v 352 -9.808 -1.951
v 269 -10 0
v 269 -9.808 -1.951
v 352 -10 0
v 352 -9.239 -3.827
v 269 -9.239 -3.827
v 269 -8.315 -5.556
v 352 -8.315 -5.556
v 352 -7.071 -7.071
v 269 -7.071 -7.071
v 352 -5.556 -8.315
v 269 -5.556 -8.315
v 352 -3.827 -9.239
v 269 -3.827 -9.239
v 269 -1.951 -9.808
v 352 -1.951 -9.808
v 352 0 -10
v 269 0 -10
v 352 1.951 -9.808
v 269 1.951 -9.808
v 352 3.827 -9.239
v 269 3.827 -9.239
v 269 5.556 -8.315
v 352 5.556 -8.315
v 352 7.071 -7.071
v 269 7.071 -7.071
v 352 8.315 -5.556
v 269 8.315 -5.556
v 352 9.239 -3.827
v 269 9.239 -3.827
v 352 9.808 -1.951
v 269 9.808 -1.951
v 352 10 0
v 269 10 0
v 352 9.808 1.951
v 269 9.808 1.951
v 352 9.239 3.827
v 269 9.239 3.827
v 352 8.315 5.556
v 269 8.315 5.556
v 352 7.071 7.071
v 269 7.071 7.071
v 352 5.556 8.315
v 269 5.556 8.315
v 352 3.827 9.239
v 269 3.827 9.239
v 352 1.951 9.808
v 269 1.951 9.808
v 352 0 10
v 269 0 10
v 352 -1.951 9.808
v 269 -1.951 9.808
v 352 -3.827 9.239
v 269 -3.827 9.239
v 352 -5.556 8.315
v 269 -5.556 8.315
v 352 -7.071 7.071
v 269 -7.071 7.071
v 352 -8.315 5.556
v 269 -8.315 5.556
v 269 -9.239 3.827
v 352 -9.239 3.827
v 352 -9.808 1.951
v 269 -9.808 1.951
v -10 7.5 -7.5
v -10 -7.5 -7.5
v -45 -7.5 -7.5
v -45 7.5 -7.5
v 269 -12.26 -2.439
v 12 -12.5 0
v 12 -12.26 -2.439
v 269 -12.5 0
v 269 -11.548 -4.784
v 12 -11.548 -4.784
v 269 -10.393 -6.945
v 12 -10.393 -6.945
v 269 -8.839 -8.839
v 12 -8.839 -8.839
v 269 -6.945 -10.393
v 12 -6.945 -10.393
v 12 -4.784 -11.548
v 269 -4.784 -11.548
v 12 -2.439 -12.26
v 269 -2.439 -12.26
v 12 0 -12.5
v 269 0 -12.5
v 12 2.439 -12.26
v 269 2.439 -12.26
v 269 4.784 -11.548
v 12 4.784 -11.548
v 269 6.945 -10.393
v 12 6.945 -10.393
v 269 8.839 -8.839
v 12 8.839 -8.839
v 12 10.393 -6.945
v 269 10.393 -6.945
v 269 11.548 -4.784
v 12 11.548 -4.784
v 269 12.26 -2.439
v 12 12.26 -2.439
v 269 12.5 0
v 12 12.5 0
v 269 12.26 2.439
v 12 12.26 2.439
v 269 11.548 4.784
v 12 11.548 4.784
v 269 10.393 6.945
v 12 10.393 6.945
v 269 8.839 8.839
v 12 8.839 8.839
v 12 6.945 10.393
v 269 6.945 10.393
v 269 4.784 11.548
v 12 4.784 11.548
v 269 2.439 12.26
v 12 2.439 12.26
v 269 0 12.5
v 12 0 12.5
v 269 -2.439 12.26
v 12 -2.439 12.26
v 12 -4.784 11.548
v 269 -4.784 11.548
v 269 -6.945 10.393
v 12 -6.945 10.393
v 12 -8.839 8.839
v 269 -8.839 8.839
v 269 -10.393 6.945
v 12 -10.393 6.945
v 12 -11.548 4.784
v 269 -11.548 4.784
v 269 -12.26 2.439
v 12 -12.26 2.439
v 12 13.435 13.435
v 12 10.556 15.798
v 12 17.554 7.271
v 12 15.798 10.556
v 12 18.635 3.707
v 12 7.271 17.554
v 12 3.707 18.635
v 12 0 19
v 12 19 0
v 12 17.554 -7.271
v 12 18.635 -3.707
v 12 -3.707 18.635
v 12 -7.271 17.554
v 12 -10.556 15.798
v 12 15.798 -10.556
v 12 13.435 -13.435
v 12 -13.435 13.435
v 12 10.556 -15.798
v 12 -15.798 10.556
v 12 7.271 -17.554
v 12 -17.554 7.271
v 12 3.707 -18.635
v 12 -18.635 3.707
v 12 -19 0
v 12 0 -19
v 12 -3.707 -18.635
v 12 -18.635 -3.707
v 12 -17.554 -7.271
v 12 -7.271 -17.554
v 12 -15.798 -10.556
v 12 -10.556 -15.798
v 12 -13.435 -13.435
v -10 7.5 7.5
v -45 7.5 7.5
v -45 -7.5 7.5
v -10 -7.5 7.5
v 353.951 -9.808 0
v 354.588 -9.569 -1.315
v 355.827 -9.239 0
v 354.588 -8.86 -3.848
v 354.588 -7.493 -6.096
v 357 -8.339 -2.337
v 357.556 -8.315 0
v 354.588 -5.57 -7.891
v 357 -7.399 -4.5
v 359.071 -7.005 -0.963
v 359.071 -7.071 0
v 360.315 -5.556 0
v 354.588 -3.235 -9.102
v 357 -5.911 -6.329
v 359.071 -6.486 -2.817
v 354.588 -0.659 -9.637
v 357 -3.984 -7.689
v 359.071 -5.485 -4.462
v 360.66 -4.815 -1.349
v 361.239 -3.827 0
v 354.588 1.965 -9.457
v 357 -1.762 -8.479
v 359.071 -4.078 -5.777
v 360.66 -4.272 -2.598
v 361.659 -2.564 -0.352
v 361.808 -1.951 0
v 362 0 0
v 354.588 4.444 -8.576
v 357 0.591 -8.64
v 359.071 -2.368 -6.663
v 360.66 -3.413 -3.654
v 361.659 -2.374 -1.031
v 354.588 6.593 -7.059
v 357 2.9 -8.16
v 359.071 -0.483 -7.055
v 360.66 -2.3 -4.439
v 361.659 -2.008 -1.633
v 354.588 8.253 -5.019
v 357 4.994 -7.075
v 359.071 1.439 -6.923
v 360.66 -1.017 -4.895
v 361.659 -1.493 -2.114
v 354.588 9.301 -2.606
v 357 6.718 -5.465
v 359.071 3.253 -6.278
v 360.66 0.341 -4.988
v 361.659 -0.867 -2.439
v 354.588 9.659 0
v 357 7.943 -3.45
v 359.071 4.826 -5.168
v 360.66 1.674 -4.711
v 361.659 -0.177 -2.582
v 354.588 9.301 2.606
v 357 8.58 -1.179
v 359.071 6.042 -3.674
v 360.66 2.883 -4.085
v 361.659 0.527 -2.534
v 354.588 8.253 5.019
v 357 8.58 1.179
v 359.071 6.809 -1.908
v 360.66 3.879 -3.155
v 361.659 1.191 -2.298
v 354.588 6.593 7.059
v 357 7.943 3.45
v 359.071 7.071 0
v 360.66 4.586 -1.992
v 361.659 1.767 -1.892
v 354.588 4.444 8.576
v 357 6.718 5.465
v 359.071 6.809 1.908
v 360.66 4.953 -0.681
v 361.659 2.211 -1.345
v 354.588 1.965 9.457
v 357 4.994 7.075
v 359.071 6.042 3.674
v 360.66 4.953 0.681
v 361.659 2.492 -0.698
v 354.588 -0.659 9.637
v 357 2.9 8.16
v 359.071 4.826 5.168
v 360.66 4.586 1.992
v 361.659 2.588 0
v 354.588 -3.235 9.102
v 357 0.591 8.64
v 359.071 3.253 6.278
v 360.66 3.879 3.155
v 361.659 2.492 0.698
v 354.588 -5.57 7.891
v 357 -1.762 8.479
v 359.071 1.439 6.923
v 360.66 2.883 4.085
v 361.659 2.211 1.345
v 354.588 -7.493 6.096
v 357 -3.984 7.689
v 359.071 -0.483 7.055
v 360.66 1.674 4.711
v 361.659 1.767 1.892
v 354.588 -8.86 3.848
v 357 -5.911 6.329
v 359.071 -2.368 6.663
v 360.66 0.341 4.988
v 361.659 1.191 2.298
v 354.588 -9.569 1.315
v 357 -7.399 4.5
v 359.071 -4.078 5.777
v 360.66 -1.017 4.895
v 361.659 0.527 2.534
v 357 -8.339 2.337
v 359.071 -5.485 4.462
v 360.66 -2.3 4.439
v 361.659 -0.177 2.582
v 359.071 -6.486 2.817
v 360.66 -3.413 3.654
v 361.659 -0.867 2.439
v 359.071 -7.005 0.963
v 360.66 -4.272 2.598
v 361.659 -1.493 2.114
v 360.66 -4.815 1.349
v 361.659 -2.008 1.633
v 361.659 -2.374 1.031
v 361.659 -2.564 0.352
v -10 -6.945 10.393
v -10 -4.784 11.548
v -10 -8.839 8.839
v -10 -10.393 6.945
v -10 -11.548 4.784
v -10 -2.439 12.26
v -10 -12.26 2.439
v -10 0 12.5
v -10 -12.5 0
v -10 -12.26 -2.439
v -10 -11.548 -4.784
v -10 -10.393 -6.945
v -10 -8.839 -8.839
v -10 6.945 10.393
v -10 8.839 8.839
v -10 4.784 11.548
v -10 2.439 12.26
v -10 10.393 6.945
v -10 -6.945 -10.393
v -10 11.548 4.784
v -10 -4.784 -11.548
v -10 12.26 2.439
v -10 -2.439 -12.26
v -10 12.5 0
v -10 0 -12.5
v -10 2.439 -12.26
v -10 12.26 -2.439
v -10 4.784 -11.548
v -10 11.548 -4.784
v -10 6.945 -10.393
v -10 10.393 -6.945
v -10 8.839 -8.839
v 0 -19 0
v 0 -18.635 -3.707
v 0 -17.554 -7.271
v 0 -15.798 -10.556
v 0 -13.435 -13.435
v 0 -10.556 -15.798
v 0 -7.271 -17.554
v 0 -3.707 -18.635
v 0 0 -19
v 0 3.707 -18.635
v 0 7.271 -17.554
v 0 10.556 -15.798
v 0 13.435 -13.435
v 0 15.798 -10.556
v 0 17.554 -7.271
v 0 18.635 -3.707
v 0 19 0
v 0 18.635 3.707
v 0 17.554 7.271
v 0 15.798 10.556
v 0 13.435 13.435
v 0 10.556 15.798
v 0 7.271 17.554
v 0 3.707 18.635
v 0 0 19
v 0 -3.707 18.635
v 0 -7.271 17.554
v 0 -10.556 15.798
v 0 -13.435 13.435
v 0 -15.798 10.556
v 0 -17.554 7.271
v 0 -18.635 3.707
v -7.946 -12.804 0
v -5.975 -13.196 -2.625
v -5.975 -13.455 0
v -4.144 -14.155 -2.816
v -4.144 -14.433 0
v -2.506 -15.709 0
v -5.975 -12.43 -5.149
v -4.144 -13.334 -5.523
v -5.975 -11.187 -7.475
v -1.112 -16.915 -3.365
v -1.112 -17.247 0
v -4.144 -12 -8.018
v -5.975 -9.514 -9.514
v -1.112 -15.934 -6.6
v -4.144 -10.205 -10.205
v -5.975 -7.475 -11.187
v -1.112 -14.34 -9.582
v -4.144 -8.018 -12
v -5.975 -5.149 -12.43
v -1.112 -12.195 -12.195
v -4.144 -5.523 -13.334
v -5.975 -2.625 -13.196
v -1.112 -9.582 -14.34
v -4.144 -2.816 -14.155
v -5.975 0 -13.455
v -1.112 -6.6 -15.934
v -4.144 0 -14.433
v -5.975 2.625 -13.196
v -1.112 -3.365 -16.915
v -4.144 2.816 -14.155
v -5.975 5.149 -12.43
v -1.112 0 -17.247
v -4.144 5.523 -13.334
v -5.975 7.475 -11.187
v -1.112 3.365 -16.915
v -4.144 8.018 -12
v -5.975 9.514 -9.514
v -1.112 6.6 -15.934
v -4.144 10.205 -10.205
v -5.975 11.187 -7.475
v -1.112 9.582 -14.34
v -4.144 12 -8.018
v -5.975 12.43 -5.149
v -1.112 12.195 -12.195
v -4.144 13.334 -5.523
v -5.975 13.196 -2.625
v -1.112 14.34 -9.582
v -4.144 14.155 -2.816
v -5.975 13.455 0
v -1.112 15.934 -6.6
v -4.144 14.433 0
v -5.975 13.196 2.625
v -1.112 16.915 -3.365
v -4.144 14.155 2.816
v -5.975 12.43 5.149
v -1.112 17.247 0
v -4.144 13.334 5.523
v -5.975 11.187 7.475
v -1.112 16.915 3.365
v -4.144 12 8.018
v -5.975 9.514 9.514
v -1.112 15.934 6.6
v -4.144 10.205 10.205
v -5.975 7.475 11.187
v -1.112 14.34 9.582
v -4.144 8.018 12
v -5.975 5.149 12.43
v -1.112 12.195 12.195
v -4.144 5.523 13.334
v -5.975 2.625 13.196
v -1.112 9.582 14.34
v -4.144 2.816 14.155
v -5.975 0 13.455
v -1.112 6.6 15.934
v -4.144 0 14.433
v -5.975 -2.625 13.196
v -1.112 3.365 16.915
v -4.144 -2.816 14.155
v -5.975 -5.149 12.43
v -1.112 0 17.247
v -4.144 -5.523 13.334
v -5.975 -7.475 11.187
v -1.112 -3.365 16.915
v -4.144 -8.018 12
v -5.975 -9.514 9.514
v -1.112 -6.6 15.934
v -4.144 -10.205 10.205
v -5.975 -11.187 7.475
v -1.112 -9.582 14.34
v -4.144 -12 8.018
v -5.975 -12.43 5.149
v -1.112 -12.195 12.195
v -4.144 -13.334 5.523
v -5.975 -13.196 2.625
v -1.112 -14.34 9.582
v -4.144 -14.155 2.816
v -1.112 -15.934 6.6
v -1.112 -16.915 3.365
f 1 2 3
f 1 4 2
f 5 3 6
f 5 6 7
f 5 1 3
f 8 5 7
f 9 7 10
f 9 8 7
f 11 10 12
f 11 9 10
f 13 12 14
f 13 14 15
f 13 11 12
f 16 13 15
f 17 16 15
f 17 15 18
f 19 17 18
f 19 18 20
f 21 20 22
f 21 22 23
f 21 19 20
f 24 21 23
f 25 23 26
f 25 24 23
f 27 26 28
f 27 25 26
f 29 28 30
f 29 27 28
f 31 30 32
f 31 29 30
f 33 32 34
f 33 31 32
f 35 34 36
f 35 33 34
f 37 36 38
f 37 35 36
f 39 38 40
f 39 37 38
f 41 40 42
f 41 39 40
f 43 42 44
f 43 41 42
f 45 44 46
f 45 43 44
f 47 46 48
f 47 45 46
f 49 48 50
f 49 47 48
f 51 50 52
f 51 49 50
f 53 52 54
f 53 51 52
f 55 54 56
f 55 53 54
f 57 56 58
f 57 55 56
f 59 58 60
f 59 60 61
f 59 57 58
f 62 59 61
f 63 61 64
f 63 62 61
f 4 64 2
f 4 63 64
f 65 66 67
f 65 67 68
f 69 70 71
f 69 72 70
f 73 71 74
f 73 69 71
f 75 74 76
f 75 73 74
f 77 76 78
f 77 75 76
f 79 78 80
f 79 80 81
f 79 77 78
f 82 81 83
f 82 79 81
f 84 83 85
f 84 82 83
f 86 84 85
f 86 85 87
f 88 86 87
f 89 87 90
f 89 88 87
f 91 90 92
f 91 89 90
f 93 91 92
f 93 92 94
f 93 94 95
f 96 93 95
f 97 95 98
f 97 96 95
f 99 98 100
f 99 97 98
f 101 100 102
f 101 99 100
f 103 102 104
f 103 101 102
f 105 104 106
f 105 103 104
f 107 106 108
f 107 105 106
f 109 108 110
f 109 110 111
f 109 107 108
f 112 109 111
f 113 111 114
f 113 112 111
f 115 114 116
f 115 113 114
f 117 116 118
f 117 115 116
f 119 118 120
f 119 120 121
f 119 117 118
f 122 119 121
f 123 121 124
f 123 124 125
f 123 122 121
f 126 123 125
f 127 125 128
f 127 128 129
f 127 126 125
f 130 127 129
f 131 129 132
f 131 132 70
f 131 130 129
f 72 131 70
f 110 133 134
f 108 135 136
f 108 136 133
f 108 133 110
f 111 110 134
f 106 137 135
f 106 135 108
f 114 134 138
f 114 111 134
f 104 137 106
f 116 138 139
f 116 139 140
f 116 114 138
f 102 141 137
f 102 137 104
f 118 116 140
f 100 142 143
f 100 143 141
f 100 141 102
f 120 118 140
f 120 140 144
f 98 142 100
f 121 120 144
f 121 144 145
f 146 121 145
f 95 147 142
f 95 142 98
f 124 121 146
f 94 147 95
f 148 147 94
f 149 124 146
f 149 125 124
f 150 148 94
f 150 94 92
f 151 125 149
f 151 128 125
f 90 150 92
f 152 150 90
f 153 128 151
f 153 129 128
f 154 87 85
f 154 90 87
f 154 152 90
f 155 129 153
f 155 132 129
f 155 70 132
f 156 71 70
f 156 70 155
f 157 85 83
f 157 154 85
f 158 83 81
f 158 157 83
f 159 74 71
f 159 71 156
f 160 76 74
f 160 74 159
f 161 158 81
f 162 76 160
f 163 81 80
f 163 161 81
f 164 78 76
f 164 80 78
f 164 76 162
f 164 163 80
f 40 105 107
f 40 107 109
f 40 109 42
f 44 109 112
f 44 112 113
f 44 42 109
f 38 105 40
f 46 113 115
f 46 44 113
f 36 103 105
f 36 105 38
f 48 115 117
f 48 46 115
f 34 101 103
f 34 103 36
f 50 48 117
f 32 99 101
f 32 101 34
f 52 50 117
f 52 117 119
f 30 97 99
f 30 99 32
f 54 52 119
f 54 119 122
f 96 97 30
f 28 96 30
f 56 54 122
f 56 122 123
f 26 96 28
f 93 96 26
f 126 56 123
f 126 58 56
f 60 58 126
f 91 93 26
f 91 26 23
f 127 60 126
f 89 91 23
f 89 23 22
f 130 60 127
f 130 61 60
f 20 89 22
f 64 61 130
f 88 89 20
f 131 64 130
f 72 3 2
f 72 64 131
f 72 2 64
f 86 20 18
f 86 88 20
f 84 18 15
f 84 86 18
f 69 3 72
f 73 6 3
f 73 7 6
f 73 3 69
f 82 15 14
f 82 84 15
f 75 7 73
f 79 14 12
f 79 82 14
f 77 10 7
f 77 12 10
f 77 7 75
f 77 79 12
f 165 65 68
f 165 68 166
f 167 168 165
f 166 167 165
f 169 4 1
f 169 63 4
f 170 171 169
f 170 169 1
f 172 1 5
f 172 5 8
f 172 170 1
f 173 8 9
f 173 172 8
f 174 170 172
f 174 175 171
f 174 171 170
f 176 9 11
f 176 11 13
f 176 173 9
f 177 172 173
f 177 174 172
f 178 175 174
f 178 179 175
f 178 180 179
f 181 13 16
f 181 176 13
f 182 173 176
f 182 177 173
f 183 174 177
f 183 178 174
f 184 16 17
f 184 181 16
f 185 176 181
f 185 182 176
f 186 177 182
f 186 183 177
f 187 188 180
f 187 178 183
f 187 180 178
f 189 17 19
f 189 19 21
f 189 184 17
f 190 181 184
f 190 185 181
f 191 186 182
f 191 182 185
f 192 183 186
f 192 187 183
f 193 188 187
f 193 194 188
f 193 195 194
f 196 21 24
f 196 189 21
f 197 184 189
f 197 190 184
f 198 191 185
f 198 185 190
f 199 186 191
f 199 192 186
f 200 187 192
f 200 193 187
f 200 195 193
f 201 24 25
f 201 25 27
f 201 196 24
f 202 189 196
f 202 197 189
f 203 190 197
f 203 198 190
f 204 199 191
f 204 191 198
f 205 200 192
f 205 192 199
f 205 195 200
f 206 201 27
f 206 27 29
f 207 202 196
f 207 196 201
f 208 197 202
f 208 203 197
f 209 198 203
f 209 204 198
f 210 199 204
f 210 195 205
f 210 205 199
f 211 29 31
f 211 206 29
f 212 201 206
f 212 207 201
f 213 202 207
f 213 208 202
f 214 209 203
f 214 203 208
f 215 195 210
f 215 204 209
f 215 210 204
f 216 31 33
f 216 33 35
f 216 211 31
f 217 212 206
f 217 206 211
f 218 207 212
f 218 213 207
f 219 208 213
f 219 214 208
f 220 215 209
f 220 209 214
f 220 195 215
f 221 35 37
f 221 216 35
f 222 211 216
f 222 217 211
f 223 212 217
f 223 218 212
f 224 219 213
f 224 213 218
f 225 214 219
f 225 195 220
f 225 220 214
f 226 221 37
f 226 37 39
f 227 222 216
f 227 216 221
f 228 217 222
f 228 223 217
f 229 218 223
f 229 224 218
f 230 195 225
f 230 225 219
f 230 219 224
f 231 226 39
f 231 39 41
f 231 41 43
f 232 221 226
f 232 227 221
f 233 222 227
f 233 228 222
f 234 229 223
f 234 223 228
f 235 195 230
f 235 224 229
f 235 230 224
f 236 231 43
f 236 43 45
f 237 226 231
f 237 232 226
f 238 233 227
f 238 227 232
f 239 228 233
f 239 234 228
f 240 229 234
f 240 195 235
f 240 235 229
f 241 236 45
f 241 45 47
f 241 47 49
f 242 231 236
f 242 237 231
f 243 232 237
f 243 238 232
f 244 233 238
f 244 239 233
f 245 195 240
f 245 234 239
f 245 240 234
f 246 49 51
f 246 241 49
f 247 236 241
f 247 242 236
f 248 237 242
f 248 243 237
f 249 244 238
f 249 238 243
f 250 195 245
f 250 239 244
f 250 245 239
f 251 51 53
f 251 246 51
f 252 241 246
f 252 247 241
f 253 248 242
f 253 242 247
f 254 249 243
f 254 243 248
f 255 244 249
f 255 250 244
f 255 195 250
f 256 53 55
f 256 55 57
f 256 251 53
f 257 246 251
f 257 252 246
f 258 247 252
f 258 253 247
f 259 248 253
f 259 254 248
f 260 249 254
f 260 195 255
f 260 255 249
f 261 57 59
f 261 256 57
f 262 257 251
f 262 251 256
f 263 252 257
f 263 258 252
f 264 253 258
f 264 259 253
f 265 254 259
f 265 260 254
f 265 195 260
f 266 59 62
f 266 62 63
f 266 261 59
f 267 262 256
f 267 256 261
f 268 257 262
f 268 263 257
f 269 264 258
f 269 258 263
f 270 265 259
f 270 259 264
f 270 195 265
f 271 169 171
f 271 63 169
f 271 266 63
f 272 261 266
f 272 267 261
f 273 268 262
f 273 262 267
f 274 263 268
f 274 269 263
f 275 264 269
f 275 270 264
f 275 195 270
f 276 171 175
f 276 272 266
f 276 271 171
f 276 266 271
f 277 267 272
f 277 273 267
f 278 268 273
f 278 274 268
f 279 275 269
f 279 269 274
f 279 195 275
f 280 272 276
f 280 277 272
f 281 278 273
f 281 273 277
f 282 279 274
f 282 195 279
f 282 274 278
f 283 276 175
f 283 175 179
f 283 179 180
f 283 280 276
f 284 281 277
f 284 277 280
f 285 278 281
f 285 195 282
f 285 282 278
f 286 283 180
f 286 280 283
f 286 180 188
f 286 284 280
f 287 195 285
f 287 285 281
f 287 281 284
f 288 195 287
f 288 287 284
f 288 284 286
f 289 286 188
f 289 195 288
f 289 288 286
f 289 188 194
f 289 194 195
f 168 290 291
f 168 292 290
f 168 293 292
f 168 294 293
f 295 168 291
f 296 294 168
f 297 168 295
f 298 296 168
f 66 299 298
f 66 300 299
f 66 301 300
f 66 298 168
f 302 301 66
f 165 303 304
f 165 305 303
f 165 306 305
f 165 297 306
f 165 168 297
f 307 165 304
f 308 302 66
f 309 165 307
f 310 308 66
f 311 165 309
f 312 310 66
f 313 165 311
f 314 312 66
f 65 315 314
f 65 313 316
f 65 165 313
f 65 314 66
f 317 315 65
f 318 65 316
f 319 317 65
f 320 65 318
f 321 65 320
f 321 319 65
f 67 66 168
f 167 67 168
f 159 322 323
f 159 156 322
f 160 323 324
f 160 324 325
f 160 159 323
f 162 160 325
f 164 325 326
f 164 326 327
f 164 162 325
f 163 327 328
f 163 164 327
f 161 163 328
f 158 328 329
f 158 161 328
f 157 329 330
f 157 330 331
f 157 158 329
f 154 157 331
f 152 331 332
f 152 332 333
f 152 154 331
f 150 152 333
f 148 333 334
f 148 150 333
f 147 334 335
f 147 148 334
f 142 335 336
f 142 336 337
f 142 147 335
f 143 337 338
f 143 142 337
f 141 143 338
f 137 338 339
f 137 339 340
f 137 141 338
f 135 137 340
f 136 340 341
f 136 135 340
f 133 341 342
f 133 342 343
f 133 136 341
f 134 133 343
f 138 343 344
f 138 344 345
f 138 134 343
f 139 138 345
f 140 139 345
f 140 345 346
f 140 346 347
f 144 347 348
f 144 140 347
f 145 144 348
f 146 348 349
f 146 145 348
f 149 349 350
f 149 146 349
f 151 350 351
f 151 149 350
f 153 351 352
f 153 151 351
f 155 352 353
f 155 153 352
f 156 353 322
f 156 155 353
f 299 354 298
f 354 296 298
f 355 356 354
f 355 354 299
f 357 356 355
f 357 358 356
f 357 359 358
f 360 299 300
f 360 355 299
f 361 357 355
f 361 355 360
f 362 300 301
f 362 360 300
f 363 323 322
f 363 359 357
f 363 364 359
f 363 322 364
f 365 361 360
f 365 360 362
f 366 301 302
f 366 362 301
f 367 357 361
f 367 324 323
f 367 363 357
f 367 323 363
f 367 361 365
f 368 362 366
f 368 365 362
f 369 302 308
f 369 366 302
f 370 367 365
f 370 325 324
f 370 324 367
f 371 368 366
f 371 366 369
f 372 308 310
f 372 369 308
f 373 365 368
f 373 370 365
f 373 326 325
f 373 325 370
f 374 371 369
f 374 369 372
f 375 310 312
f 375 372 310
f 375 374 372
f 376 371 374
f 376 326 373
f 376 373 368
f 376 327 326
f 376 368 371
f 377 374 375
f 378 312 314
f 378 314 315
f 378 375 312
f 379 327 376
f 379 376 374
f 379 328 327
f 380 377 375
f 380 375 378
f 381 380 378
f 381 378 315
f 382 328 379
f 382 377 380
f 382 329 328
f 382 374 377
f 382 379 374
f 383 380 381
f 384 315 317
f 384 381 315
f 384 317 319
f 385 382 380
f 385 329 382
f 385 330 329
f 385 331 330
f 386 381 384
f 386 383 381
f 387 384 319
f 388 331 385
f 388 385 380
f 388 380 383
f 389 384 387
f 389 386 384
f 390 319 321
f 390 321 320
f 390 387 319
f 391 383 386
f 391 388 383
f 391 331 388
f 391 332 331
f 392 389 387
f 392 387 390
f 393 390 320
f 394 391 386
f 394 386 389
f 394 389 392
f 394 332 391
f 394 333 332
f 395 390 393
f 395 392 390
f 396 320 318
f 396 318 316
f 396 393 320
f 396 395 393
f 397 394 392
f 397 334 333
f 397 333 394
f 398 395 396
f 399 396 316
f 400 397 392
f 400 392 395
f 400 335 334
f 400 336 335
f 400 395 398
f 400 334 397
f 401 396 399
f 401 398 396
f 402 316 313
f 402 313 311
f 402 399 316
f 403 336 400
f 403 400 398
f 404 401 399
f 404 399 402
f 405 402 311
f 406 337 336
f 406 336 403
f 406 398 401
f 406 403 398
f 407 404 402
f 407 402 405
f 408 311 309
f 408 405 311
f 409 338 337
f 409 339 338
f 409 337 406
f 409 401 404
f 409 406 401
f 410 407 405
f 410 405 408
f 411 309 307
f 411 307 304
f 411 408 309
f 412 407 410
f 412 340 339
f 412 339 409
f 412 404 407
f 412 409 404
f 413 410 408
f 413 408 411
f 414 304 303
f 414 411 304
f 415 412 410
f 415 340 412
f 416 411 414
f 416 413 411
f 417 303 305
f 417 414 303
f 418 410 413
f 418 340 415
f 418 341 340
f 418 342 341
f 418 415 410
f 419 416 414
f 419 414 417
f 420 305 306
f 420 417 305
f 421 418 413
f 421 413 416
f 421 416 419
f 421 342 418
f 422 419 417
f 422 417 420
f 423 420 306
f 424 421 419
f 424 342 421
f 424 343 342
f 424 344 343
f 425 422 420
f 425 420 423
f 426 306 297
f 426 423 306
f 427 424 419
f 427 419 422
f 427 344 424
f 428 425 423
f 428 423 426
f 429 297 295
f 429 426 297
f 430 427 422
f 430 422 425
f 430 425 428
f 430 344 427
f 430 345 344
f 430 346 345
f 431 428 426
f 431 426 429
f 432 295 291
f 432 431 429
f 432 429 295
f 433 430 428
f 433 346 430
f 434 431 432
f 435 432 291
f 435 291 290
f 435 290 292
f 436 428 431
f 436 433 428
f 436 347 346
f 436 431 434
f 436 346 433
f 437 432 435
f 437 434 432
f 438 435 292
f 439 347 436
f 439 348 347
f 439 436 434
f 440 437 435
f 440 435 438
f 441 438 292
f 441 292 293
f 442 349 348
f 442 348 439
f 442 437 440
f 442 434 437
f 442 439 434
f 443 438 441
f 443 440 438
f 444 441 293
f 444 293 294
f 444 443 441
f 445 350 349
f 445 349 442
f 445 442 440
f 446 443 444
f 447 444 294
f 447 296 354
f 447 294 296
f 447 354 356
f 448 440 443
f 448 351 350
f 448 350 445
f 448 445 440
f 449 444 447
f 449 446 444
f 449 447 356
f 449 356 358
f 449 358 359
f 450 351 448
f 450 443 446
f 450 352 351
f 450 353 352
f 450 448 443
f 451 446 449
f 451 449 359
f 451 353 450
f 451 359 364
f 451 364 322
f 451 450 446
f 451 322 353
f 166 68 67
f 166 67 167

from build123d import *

# Parameters (mm, degrees)
SKETCH2_W           = 15
SKETCH2_H           = 15
BOSS_EXTRUDE1_DEPTH = 35


with BuildPart() as part:
    # Sketch1 → Revolve1 (revolve)
    with BuildSketch(Plane.XY, mode=Mode.PRIVATE) as revolve1_sk:
        with BuildLine():
            Line((0, 19), (12, 19))
            Line((12, 19), (12, 12.5))
            Line((12, 12.5), (269, 12.5))
            Line((269, 12.5), (269, 10))
            Line((269, 10), (352, 10))
            ThreePointArc((352, 10), (359.071067812, 7.071067812), (362, 0))
            Line((362, 0), (-10, 0))
            Line((-10, 0), (-10, 12.5))
            ThreePointArc((-10, 12.5), (-4.143637104, 14.432518621), (0, 19))
        make_face()
    revolve(revolve1_sk.sketch.rotate(Axis((-14.332813636, 0, 0), (1, 0, 0)), 180), axis=Axis((-14.332813636, 0, 0), (1, 0, 0)))

    # Sketch2 → Boss-Extrude1 (add)
    with BuildSketch(Plane.ZY.offset(10)):
        Rectangle(SKETCH2_W, SKETCH2_H)
    extrude(amount=BOSS_EXTRUDE1_DEPTH)


solid = part.part
